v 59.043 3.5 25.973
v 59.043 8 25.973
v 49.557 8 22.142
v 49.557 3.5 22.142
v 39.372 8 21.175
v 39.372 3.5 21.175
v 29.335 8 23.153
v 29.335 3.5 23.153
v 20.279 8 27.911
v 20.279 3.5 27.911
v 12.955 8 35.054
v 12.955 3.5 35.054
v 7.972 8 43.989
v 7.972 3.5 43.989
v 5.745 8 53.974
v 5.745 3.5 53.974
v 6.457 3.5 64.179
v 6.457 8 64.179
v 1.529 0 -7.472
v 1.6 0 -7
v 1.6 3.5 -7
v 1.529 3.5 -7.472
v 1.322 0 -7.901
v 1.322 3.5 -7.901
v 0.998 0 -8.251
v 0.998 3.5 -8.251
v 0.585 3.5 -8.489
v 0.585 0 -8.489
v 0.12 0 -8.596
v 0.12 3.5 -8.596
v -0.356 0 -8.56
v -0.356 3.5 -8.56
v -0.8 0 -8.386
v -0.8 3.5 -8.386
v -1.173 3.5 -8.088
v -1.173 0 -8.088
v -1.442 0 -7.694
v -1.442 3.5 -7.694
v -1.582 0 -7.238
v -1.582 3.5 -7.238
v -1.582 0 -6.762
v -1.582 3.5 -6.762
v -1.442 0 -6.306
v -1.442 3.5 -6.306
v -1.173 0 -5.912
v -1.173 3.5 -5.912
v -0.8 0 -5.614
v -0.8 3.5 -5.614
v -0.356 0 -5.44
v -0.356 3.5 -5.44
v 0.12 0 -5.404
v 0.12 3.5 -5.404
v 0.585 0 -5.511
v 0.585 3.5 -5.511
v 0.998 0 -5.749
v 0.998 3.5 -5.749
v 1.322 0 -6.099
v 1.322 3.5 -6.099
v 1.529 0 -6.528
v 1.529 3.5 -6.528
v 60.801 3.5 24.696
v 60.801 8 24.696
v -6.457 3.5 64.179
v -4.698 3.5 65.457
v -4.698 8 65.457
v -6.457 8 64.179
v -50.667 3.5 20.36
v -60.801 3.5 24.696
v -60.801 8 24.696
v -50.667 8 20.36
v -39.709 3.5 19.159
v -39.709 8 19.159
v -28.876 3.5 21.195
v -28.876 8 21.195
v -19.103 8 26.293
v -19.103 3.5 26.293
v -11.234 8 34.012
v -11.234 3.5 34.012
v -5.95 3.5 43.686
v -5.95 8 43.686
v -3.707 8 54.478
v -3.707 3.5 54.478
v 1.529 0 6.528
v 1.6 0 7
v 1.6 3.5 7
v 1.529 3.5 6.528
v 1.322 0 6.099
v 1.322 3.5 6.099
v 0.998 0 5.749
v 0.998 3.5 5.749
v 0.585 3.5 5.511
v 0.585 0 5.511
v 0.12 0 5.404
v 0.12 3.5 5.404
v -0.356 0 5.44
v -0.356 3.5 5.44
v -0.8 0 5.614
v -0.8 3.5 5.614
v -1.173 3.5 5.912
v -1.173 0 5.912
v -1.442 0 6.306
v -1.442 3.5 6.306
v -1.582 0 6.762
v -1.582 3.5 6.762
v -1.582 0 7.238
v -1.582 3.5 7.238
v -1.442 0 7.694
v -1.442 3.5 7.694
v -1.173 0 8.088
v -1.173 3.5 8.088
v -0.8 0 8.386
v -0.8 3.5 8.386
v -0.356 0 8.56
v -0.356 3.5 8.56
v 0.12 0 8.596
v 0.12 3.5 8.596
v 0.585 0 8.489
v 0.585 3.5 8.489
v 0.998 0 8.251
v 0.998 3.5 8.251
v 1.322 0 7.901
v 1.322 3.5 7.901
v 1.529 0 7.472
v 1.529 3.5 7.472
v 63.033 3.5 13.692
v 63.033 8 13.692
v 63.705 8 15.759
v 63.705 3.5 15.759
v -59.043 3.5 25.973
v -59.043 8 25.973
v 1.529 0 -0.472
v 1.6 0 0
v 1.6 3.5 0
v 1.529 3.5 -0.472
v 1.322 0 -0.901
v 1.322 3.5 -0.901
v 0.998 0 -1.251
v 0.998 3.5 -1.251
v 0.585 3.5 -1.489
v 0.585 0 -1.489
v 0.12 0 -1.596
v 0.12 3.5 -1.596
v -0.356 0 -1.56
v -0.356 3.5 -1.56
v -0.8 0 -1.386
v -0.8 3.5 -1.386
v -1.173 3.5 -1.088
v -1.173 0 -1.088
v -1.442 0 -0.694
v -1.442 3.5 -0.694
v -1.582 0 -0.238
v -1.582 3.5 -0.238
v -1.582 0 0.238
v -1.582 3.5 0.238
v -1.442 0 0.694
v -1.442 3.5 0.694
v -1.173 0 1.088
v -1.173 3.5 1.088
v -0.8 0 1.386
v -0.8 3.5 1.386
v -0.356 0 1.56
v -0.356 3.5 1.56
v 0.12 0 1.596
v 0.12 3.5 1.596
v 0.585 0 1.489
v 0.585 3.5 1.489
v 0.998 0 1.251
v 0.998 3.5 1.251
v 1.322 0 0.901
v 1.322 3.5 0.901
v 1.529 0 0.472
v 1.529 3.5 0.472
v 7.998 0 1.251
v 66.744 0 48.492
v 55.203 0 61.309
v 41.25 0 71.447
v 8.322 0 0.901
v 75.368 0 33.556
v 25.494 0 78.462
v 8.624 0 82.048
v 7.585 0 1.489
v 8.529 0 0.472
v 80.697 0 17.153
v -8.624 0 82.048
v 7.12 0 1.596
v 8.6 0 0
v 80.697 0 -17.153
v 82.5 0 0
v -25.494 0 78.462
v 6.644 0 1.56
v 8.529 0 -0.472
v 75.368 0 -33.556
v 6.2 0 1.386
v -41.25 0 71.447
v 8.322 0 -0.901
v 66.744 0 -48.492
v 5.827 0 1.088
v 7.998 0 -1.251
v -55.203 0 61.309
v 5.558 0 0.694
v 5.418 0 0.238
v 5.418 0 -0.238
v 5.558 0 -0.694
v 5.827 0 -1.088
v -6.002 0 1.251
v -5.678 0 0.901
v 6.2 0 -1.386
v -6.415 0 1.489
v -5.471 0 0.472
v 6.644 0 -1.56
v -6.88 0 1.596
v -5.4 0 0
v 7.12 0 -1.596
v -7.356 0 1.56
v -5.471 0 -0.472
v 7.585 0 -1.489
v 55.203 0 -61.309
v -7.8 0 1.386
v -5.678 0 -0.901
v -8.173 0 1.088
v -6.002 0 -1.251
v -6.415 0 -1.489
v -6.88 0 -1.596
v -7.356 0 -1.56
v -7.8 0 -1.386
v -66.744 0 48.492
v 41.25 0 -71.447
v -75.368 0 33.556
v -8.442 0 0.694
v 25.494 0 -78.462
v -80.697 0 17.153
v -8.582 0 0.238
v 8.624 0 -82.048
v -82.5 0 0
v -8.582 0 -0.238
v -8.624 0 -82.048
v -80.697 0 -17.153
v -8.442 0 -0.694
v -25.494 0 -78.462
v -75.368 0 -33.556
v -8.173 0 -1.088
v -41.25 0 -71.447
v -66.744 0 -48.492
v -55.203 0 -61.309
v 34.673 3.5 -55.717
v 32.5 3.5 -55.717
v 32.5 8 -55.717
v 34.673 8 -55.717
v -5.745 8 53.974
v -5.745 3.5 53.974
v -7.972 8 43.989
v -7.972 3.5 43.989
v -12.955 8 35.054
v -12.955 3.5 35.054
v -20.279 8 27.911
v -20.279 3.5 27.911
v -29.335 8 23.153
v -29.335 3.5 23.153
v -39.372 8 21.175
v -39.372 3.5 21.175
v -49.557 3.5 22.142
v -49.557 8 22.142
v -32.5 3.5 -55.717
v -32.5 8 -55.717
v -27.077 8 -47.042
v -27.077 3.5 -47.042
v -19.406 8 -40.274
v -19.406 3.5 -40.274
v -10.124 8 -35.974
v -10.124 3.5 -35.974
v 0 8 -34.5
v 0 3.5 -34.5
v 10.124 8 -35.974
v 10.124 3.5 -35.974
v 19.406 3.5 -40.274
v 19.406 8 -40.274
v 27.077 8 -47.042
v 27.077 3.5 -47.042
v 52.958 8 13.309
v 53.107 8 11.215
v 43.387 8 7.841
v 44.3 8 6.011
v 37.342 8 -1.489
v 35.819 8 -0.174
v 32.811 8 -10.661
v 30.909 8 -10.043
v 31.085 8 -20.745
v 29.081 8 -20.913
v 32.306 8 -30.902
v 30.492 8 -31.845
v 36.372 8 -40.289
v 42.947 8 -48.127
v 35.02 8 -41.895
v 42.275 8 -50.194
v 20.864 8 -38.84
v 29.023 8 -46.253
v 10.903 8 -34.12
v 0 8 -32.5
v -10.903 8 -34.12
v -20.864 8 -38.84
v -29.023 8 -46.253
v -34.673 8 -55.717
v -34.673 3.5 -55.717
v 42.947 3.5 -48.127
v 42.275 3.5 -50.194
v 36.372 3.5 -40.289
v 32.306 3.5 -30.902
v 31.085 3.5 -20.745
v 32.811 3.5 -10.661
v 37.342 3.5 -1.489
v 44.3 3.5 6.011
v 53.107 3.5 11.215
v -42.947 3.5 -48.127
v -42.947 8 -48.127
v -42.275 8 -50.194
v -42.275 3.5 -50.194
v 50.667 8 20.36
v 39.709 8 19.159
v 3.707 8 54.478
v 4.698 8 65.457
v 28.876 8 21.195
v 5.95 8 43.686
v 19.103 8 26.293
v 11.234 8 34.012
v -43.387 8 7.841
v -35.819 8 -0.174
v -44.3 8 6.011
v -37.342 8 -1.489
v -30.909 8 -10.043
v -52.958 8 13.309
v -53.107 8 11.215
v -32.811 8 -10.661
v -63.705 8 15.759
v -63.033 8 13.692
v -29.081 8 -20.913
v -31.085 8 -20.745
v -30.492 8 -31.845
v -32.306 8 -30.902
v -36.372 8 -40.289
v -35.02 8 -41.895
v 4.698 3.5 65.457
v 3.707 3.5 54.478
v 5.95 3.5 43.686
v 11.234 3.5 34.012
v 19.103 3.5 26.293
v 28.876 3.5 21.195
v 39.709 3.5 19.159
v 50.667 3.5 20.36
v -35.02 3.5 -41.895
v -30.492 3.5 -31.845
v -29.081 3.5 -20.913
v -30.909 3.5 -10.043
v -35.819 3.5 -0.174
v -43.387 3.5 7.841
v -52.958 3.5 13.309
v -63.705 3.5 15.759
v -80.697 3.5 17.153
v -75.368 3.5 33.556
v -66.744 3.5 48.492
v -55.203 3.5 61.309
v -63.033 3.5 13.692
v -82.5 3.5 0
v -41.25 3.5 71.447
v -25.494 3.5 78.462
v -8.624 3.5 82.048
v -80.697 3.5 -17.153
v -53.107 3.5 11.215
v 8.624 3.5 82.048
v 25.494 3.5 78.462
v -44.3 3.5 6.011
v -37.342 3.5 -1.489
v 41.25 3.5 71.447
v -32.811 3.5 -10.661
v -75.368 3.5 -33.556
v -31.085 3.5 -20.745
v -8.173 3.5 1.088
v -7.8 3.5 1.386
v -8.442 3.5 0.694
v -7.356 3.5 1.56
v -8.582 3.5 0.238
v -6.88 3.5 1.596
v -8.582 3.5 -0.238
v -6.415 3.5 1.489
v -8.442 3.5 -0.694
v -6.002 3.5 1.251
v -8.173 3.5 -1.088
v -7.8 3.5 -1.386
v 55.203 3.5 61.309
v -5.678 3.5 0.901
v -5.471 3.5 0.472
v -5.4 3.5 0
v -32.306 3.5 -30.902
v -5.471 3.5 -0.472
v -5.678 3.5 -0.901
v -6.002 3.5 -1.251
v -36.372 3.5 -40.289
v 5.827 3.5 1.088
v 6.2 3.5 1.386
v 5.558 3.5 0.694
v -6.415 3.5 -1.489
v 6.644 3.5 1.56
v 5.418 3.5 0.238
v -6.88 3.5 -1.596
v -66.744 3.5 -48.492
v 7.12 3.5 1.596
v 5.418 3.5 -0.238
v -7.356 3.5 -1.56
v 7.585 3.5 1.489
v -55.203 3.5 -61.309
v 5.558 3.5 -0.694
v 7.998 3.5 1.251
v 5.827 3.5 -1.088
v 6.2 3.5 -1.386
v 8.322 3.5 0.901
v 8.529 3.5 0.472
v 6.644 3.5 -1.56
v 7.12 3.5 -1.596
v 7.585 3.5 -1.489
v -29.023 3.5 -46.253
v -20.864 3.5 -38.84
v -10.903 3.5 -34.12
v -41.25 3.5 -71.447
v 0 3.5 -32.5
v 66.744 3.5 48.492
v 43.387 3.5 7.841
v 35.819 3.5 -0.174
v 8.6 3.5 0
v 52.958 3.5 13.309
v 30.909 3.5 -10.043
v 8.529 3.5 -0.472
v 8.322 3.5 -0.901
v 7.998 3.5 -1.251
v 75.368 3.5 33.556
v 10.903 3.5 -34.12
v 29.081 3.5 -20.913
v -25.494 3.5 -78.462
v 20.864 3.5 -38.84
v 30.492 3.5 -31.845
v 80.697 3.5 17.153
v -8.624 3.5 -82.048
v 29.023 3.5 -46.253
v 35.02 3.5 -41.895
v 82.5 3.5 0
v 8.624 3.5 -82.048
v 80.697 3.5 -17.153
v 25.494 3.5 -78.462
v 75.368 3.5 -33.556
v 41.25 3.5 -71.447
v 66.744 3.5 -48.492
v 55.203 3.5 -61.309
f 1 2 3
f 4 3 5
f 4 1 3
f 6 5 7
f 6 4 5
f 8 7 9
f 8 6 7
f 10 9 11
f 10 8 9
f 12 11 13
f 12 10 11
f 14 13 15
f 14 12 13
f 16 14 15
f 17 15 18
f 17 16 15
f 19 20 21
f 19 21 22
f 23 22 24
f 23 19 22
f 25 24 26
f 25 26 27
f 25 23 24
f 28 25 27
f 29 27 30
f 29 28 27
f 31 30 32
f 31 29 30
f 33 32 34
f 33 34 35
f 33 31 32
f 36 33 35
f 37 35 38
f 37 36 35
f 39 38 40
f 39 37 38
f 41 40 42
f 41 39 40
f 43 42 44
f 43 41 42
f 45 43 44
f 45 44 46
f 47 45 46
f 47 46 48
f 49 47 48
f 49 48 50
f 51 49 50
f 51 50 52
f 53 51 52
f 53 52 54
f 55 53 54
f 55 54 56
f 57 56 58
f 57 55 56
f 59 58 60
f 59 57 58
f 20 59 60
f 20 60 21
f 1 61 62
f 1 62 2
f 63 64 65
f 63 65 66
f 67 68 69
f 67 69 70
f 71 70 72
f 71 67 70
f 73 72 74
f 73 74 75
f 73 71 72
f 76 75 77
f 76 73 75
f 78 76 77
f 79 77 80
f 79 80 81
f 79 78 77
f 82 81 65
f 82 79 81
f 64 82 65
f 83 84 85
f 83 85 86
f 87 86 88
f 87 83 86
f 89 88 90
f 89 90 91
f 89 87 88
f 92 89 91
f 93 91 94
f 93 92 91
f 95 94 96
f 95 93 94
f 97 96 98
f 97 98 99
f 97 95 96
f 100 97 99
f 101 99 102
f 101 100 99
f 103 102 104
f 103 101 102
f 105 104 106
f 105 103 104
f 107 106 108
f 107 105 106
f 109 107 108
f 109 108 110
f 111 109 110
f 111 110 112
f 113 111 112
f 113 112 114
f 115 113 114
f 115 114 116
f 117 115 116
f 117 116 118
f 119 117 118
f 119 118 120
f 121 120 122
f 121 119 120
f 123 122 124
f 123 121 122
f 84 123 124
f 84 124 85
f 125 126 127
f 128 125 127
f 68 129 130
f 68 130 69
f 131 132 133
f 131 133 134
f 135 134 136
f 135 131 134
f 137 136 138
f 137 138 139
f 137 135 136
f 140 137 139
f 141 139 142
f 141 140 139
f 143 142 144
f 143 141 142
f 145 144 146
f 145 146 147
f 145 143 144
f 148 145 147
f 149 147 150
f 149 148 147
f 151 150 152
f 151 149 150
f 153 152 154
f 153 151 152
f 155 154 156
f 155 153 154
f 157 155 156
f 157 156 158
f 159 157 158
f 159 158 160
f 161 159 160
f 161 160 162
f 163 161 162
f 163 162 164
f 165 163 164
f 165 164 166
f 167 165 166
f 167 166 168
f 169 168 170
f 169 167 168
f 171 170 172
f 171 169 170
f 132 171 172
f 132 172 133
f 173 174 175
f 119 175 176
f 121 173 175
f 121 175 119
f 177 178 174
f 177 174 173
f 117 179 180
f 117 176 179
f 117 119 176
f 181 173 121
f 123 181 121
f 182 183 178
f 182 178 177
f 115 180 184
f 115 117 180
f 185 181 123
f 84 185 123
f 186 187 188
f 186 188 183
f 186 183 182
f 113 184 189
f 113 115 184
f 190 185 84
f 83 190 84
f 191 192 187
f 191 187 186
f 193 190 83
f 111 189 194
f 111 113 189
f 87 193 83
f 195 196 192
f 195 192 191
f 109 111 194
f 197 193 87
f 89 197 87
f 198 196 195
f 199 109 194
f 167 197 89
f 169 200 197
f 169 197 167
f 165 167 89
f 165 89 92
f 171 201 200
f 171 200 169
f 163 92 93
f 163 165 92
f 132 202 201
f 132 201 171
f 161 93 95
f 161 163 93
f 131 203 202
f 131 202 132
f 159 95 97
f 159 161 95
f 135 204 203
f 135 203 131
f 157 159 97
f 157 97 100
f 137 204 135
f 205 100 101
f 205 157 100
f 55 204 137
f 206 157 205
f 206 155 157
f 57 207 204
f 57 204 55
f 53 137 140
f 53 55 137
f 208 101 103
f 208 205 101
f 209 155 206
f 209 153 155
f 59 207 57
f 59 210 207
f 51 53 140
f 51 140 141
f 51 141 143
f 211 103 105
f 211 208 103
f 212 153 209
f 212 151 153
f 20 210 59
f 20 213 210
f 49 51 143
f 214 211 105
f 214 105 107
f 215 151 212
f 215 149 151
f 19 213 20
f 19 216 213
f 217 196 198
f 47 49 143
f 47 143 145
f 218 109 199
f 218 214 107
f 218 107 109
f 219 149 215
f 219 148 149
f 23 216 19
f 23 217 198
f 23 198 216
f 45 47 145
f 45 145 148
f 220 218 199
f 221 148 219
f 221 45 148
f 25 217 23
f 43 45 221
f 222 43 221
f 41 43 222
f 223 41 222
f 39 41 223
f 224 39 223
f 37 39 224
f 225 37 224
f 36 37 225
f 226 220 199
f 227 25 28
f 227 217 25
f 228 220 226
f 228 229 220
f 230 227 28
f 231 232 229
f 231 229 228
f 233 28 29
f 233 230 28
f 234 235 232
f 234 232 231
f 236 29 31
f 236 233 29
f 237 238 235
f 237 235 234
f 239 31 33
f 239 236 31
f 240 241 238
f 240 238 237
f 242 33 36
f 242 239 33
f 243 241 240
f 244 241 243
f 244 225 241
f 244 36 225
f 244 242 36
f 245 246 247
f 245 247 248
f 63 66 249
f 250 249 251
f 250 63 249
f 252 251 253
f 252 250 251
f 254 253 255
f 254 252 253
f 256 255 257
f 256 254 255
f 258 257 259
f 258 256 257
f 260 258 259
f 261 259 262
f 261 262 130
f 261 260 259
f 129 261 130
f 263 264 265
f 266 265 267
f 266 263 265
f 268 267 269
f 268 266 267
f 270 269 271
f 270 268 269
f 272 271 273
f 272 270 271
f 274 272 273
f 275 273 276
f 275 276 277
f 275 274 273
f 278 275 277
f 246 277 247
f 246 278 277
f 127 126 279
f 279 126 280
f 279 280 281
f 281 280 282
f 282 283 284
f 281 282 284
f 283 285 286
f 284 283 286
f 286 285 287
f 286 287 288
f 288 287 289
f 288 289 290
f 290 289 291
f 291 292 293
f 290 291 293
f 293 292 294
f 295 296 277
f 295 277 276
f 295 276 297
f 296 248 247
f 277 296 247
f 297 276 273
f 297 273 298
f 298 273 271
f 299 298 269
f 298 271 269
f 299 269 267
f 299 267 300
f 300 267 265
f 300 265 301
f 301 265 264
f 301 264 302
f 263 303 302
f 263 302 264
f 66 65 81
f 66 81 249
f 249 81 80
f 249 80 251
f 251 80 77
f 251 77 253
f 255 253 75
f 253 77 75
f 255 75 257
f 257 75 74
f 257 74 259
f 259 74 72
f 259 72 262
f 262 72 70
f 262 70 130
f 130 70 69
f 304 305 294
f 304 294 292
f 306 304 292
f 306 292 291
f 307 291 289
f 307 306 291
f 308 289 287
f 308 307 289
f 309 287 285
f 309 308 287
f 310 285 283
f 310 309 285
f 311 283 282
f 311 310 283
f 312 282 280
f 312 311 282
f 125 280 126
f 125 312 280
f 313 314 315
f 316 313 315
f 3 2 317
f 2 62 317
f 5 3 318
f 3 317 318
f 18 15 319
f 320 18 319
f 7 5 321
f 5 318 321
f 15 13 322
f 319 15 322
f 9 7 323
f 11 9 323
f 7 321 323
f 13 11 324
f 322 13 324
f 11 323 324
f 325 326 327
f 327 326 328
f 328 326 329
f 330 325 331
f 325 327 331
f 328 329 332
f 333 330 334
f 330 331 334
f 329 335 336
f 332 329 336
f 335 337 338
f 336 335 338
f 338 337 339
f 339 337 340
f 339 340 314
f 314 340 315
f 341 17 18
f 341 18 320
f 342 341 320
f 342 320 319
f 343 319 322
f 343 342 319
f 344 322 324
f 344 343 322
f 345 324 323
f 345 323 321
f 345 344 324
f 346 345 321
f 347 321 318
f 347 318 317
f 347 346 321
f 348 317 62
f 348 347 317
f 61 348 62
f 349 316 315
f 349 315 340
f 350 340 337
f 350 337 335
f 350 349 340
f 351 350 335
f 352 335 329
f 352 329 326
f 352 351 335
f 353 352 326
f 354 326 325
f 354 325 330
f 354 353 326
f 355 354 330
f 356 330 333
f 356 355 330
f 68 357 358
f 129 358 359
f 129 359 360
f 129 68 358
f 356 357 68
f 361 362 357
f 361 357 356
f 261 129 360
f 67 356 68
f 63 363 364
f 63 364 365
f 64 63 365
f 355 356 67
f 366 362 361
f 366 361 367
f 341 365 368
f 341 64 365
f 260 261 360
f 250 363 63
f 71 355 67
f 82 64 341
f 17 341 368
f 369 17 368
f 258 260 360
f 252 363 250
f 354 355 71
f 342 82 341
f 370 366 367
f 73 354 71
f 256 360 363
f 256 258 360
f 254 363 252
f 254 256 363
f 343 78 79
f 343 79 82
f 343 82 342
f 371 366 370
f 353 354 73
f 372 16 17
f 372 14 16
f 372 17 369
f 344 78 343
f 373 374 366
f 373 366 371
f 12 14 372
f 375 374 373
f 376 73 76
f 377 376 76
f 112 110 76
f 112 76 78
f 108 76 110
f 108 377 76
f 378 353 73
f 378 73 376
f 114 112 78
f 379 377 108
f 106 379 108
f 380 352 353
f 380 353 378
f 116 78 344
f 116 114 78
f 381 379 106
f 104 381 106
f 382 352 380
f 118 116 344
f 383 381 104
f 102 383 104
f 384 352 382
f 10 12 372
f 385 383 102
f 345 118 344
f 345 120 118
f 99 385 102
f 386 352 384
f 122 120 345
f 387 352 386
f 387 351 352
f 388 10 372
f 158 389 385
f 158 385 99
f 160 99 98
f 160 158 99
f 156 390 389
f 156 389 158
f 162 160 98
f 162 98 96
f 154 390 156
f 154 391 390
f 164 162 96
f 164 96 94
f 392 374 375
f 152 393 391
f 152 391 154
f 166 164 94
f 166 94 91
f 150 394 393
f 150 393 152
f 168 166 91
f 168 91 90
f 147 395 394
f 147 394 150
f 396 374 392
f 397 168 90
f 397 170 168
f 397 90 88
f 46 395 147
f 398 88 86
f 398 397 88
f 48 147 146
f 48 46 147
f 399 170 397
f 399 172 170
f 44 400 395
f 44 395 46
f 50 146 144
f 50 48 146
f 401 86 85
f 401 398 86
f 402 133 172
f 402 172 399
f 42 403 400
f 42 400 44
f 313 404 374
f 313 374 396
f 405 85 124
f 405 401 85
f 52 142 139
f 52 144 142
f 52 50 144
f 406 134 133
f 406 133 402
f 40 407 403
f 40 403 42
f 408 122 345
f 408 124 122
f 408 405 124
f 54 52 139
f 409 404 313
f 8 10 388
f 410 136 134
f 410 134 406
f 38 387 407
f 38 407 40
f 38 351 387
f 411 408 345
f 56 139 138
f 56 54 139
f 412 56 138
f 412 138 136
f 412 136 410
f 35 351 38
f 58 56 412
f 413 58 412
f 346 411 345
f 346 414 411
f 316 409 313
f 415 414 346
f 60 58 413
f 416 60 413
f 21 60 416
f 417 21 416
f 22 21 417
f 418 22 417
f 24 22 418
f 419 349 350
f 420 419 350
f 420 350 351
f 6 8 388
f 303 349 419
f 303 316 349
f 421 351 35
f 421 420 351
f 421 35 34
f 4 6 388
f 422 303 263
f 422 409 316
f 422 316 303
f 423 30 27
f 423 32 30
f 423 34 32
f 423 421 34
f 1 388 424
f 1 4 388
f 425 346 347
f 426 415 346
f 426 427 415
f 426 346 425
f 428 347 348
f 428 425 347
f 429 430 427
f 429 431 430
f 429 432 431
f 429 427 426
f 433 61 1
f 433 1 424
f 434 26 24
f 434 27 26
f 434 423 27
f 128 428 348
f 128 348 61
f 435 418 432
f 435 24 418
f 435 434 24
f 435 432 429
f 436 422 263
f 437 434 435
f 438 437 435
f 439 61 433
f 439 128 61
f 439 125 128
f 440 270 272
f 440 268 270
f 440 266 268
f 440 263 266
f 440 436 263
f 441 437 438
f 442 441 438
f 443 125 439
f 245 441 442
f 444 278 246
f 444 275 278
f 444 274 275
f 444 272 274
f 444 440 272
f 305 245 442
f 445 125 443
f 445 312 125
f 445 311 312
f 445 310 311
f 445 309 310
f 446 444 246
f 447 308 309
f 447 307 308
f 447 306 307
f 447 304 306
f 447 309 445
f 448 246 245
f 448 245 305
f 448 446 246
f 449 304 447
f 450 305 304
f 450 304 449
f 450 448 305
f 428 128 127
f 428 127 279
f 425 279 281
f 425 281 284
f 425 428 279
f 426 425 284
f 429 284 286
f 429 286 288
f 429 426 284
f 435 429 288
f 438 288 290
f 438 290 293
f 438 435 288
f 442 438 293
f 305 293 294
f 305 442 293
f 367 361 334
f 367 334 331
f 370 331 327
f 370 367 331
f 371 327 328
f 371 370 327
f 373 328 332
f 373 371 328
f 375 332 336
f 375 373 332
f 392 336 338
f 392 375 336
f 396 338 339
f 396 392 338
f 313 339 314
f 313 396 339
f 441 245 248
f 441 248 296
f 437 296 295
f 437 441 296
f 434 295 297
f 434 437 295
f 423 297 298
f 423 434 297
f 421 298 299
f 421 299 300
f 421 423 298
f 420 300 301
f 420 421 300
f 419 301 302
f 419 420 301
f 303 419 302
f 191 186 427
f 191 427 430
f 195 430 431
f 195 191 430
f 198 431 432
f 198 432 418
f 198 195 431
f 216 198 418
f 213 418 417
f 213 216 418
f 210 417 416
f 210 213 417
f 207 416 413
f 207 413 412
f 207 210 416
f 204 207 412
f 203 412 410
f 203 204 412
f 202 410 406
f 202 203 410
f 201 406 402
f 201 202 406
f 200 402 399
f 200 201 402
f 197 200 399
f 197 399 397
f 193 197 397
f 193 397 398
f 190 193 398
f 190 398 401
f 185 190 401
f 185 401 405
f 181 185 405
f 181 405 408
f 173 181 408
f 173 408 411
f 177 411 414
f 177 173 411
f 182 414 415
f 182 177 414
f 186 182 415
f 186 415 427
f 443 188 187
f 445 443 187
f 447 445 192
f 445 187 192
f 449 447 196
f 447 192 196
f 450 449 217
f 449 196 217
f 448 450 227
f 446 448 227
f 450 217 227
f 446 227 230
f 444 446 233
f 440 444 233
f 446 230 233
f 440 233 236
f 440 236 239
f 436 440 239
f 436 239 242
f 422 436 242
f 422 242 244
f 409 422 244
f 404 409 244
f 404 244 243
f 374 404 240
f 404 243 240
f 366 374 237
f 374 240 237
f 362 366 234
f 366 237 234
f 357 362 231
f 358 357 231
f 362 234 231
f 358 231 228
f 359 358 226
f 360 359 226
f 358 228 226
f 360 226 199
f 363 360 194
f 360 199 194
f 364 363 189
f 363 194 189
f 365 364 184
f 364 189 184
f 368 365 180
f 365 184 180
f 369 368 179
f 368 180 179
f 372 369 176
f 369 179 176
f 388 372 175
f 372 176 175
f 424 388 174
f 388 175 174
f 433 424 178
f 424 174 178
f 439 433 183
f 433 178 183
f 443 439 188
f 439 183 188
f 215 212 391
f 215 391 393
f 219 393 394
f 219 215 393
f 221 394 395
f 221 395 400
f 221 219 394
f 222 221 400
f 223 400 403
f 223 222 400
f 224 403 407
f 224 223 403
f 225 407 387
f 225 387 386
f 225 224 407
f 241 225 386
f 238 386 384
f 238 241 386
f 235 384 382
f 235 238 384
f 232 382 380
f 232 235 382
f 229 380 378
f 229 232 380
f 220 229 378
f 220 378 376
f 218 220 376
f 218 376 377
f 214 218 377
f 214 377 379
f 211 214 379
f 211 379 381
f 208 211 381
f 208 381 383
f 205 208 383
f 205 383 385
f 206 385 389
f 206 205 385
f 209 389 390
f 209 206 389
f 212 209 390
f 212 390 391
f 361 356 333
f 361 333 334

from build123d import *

# Parameters (mm, degrees)
SKETCH_2_R      = 82.5
SKETCH_2_R_2    = 1.6
EXTRUDE_1_DEPTH = 3.5
EXTRUDE_2_DEPTH = 8


with BuildPart() as part:
    # 草图2 → 凸台-拉伸1 (new body)
    with BuildSketch(Plane(origin=(0, 0, 0), x_dir=(1, 0, 0), z_dir=(0, 1, 0))):
        Circle(SKETCH_2_R)
        with Locations((0, -7)):
            Circle(SKETCH_2_R_2, mode=Mode.SUBTRACT)
        with Locations((-7, 0)):
            Circle(SKETCH_2_R_2, mode=Mode.SUBTRACT)
        Circle(SKETCH_2_R_2, mode=Mode.SUBTRACT)
        with Locations((7, 0)):
            Circle(SKETCH_2_R_2, mode=Mode.SUBTRACT)
        with Locations((0, 7)):
            Circle(SKETCH_2_R_2, mode=Mode.SUBTRACT)
    extrude(amount=EXTRUDE_1_DEPTH)

    # 草图2<3> → 凸台-拉伸2 (add)
    with BuildSketch(Plane(origin=(0, 0, 0), x_dir=(1, 0, 0), z_dir=(0, 1, 0))):
        with BuildLine():
            ThreePointArc((32.5, 55.717143143), (0, 34.5), (-32.5, 55.717143143))
            Line((-32.5, 55.717143143), (-34.673476895, 55.717143143))
            ThreePointArc((-34.673476895, 55.717143143), (0, 32.5), (34.673476895, 55.717143143))
            Line((34.673476895, 55.717143143), (32.5, 55.717143143))
        make_face()
        with BuildLine():
            ThreePointArc((63.033204373, -13.69179267), (32.811449812, 10.661086306), (42.947099738, 48.126880889))
            Line((42.947099738, 48.126880889), (42.275458441, 50.193980253))
            ThreePointArc((42.275458441, 50.193980253), (30.90933678, 10.043052317), (63.70484567, -15.758892035))
            Line((63.70484567, -15.758892035), (63.033204373, -13.69179267))
        make_face()
        with BuildLine():
            ThreePointArc((6.456662722, -64.17913638), (20.278591204, -27.911086306), (59.042767356, -25.973094981))
            Line((59.042767356, -25.973094981), (60.801147102, -24.695557316))
            ThreePointArc((60.801147102, -24.695557316), (19.1030207, -26.293052317), (4.698282977, -65.456674045))
            Line((4.698282977, -65.456674045), (6.456662722, -64.17913638))
        make_face()
        with BuildLine():
            ThreePointArc((-59.042767356, -25.973094981), (-20.278591204, -27.911086306), (-6.456662722, -64.17913638))
            Line((-6.456662722, -64.17913638), (-4.698282977, -65.456674045))
            ThreePointArc((-4.698282977, -65.456674045), (-19.1030207, -26.293052317), (-60.801147102, -24.695557316))
            Line((-60.801147102, -24.695557316), (-59.042767356, -25.973094981))
        make_face()
        with BuildLine():
            ThreePointArc((-42.947099738, 48.126880889), (-32.811449812, 10.661086306), (-63.033204373, -13.69179267))
            Line((-63.033204373, -13.69179267), (-63.70484567, -15.758892035))
            ThreePointArc((-63.70484567, -15.758892035), (-30.90933678, 10.043052317), (-42.275458441, 50.193980253))
            Line((-42.275458441, 50.193980253), (-42.947099738, 48.126880889))
        make_face()
    extrude(amount=EXTRUDE_2_DEPTH)


solid = part.part
